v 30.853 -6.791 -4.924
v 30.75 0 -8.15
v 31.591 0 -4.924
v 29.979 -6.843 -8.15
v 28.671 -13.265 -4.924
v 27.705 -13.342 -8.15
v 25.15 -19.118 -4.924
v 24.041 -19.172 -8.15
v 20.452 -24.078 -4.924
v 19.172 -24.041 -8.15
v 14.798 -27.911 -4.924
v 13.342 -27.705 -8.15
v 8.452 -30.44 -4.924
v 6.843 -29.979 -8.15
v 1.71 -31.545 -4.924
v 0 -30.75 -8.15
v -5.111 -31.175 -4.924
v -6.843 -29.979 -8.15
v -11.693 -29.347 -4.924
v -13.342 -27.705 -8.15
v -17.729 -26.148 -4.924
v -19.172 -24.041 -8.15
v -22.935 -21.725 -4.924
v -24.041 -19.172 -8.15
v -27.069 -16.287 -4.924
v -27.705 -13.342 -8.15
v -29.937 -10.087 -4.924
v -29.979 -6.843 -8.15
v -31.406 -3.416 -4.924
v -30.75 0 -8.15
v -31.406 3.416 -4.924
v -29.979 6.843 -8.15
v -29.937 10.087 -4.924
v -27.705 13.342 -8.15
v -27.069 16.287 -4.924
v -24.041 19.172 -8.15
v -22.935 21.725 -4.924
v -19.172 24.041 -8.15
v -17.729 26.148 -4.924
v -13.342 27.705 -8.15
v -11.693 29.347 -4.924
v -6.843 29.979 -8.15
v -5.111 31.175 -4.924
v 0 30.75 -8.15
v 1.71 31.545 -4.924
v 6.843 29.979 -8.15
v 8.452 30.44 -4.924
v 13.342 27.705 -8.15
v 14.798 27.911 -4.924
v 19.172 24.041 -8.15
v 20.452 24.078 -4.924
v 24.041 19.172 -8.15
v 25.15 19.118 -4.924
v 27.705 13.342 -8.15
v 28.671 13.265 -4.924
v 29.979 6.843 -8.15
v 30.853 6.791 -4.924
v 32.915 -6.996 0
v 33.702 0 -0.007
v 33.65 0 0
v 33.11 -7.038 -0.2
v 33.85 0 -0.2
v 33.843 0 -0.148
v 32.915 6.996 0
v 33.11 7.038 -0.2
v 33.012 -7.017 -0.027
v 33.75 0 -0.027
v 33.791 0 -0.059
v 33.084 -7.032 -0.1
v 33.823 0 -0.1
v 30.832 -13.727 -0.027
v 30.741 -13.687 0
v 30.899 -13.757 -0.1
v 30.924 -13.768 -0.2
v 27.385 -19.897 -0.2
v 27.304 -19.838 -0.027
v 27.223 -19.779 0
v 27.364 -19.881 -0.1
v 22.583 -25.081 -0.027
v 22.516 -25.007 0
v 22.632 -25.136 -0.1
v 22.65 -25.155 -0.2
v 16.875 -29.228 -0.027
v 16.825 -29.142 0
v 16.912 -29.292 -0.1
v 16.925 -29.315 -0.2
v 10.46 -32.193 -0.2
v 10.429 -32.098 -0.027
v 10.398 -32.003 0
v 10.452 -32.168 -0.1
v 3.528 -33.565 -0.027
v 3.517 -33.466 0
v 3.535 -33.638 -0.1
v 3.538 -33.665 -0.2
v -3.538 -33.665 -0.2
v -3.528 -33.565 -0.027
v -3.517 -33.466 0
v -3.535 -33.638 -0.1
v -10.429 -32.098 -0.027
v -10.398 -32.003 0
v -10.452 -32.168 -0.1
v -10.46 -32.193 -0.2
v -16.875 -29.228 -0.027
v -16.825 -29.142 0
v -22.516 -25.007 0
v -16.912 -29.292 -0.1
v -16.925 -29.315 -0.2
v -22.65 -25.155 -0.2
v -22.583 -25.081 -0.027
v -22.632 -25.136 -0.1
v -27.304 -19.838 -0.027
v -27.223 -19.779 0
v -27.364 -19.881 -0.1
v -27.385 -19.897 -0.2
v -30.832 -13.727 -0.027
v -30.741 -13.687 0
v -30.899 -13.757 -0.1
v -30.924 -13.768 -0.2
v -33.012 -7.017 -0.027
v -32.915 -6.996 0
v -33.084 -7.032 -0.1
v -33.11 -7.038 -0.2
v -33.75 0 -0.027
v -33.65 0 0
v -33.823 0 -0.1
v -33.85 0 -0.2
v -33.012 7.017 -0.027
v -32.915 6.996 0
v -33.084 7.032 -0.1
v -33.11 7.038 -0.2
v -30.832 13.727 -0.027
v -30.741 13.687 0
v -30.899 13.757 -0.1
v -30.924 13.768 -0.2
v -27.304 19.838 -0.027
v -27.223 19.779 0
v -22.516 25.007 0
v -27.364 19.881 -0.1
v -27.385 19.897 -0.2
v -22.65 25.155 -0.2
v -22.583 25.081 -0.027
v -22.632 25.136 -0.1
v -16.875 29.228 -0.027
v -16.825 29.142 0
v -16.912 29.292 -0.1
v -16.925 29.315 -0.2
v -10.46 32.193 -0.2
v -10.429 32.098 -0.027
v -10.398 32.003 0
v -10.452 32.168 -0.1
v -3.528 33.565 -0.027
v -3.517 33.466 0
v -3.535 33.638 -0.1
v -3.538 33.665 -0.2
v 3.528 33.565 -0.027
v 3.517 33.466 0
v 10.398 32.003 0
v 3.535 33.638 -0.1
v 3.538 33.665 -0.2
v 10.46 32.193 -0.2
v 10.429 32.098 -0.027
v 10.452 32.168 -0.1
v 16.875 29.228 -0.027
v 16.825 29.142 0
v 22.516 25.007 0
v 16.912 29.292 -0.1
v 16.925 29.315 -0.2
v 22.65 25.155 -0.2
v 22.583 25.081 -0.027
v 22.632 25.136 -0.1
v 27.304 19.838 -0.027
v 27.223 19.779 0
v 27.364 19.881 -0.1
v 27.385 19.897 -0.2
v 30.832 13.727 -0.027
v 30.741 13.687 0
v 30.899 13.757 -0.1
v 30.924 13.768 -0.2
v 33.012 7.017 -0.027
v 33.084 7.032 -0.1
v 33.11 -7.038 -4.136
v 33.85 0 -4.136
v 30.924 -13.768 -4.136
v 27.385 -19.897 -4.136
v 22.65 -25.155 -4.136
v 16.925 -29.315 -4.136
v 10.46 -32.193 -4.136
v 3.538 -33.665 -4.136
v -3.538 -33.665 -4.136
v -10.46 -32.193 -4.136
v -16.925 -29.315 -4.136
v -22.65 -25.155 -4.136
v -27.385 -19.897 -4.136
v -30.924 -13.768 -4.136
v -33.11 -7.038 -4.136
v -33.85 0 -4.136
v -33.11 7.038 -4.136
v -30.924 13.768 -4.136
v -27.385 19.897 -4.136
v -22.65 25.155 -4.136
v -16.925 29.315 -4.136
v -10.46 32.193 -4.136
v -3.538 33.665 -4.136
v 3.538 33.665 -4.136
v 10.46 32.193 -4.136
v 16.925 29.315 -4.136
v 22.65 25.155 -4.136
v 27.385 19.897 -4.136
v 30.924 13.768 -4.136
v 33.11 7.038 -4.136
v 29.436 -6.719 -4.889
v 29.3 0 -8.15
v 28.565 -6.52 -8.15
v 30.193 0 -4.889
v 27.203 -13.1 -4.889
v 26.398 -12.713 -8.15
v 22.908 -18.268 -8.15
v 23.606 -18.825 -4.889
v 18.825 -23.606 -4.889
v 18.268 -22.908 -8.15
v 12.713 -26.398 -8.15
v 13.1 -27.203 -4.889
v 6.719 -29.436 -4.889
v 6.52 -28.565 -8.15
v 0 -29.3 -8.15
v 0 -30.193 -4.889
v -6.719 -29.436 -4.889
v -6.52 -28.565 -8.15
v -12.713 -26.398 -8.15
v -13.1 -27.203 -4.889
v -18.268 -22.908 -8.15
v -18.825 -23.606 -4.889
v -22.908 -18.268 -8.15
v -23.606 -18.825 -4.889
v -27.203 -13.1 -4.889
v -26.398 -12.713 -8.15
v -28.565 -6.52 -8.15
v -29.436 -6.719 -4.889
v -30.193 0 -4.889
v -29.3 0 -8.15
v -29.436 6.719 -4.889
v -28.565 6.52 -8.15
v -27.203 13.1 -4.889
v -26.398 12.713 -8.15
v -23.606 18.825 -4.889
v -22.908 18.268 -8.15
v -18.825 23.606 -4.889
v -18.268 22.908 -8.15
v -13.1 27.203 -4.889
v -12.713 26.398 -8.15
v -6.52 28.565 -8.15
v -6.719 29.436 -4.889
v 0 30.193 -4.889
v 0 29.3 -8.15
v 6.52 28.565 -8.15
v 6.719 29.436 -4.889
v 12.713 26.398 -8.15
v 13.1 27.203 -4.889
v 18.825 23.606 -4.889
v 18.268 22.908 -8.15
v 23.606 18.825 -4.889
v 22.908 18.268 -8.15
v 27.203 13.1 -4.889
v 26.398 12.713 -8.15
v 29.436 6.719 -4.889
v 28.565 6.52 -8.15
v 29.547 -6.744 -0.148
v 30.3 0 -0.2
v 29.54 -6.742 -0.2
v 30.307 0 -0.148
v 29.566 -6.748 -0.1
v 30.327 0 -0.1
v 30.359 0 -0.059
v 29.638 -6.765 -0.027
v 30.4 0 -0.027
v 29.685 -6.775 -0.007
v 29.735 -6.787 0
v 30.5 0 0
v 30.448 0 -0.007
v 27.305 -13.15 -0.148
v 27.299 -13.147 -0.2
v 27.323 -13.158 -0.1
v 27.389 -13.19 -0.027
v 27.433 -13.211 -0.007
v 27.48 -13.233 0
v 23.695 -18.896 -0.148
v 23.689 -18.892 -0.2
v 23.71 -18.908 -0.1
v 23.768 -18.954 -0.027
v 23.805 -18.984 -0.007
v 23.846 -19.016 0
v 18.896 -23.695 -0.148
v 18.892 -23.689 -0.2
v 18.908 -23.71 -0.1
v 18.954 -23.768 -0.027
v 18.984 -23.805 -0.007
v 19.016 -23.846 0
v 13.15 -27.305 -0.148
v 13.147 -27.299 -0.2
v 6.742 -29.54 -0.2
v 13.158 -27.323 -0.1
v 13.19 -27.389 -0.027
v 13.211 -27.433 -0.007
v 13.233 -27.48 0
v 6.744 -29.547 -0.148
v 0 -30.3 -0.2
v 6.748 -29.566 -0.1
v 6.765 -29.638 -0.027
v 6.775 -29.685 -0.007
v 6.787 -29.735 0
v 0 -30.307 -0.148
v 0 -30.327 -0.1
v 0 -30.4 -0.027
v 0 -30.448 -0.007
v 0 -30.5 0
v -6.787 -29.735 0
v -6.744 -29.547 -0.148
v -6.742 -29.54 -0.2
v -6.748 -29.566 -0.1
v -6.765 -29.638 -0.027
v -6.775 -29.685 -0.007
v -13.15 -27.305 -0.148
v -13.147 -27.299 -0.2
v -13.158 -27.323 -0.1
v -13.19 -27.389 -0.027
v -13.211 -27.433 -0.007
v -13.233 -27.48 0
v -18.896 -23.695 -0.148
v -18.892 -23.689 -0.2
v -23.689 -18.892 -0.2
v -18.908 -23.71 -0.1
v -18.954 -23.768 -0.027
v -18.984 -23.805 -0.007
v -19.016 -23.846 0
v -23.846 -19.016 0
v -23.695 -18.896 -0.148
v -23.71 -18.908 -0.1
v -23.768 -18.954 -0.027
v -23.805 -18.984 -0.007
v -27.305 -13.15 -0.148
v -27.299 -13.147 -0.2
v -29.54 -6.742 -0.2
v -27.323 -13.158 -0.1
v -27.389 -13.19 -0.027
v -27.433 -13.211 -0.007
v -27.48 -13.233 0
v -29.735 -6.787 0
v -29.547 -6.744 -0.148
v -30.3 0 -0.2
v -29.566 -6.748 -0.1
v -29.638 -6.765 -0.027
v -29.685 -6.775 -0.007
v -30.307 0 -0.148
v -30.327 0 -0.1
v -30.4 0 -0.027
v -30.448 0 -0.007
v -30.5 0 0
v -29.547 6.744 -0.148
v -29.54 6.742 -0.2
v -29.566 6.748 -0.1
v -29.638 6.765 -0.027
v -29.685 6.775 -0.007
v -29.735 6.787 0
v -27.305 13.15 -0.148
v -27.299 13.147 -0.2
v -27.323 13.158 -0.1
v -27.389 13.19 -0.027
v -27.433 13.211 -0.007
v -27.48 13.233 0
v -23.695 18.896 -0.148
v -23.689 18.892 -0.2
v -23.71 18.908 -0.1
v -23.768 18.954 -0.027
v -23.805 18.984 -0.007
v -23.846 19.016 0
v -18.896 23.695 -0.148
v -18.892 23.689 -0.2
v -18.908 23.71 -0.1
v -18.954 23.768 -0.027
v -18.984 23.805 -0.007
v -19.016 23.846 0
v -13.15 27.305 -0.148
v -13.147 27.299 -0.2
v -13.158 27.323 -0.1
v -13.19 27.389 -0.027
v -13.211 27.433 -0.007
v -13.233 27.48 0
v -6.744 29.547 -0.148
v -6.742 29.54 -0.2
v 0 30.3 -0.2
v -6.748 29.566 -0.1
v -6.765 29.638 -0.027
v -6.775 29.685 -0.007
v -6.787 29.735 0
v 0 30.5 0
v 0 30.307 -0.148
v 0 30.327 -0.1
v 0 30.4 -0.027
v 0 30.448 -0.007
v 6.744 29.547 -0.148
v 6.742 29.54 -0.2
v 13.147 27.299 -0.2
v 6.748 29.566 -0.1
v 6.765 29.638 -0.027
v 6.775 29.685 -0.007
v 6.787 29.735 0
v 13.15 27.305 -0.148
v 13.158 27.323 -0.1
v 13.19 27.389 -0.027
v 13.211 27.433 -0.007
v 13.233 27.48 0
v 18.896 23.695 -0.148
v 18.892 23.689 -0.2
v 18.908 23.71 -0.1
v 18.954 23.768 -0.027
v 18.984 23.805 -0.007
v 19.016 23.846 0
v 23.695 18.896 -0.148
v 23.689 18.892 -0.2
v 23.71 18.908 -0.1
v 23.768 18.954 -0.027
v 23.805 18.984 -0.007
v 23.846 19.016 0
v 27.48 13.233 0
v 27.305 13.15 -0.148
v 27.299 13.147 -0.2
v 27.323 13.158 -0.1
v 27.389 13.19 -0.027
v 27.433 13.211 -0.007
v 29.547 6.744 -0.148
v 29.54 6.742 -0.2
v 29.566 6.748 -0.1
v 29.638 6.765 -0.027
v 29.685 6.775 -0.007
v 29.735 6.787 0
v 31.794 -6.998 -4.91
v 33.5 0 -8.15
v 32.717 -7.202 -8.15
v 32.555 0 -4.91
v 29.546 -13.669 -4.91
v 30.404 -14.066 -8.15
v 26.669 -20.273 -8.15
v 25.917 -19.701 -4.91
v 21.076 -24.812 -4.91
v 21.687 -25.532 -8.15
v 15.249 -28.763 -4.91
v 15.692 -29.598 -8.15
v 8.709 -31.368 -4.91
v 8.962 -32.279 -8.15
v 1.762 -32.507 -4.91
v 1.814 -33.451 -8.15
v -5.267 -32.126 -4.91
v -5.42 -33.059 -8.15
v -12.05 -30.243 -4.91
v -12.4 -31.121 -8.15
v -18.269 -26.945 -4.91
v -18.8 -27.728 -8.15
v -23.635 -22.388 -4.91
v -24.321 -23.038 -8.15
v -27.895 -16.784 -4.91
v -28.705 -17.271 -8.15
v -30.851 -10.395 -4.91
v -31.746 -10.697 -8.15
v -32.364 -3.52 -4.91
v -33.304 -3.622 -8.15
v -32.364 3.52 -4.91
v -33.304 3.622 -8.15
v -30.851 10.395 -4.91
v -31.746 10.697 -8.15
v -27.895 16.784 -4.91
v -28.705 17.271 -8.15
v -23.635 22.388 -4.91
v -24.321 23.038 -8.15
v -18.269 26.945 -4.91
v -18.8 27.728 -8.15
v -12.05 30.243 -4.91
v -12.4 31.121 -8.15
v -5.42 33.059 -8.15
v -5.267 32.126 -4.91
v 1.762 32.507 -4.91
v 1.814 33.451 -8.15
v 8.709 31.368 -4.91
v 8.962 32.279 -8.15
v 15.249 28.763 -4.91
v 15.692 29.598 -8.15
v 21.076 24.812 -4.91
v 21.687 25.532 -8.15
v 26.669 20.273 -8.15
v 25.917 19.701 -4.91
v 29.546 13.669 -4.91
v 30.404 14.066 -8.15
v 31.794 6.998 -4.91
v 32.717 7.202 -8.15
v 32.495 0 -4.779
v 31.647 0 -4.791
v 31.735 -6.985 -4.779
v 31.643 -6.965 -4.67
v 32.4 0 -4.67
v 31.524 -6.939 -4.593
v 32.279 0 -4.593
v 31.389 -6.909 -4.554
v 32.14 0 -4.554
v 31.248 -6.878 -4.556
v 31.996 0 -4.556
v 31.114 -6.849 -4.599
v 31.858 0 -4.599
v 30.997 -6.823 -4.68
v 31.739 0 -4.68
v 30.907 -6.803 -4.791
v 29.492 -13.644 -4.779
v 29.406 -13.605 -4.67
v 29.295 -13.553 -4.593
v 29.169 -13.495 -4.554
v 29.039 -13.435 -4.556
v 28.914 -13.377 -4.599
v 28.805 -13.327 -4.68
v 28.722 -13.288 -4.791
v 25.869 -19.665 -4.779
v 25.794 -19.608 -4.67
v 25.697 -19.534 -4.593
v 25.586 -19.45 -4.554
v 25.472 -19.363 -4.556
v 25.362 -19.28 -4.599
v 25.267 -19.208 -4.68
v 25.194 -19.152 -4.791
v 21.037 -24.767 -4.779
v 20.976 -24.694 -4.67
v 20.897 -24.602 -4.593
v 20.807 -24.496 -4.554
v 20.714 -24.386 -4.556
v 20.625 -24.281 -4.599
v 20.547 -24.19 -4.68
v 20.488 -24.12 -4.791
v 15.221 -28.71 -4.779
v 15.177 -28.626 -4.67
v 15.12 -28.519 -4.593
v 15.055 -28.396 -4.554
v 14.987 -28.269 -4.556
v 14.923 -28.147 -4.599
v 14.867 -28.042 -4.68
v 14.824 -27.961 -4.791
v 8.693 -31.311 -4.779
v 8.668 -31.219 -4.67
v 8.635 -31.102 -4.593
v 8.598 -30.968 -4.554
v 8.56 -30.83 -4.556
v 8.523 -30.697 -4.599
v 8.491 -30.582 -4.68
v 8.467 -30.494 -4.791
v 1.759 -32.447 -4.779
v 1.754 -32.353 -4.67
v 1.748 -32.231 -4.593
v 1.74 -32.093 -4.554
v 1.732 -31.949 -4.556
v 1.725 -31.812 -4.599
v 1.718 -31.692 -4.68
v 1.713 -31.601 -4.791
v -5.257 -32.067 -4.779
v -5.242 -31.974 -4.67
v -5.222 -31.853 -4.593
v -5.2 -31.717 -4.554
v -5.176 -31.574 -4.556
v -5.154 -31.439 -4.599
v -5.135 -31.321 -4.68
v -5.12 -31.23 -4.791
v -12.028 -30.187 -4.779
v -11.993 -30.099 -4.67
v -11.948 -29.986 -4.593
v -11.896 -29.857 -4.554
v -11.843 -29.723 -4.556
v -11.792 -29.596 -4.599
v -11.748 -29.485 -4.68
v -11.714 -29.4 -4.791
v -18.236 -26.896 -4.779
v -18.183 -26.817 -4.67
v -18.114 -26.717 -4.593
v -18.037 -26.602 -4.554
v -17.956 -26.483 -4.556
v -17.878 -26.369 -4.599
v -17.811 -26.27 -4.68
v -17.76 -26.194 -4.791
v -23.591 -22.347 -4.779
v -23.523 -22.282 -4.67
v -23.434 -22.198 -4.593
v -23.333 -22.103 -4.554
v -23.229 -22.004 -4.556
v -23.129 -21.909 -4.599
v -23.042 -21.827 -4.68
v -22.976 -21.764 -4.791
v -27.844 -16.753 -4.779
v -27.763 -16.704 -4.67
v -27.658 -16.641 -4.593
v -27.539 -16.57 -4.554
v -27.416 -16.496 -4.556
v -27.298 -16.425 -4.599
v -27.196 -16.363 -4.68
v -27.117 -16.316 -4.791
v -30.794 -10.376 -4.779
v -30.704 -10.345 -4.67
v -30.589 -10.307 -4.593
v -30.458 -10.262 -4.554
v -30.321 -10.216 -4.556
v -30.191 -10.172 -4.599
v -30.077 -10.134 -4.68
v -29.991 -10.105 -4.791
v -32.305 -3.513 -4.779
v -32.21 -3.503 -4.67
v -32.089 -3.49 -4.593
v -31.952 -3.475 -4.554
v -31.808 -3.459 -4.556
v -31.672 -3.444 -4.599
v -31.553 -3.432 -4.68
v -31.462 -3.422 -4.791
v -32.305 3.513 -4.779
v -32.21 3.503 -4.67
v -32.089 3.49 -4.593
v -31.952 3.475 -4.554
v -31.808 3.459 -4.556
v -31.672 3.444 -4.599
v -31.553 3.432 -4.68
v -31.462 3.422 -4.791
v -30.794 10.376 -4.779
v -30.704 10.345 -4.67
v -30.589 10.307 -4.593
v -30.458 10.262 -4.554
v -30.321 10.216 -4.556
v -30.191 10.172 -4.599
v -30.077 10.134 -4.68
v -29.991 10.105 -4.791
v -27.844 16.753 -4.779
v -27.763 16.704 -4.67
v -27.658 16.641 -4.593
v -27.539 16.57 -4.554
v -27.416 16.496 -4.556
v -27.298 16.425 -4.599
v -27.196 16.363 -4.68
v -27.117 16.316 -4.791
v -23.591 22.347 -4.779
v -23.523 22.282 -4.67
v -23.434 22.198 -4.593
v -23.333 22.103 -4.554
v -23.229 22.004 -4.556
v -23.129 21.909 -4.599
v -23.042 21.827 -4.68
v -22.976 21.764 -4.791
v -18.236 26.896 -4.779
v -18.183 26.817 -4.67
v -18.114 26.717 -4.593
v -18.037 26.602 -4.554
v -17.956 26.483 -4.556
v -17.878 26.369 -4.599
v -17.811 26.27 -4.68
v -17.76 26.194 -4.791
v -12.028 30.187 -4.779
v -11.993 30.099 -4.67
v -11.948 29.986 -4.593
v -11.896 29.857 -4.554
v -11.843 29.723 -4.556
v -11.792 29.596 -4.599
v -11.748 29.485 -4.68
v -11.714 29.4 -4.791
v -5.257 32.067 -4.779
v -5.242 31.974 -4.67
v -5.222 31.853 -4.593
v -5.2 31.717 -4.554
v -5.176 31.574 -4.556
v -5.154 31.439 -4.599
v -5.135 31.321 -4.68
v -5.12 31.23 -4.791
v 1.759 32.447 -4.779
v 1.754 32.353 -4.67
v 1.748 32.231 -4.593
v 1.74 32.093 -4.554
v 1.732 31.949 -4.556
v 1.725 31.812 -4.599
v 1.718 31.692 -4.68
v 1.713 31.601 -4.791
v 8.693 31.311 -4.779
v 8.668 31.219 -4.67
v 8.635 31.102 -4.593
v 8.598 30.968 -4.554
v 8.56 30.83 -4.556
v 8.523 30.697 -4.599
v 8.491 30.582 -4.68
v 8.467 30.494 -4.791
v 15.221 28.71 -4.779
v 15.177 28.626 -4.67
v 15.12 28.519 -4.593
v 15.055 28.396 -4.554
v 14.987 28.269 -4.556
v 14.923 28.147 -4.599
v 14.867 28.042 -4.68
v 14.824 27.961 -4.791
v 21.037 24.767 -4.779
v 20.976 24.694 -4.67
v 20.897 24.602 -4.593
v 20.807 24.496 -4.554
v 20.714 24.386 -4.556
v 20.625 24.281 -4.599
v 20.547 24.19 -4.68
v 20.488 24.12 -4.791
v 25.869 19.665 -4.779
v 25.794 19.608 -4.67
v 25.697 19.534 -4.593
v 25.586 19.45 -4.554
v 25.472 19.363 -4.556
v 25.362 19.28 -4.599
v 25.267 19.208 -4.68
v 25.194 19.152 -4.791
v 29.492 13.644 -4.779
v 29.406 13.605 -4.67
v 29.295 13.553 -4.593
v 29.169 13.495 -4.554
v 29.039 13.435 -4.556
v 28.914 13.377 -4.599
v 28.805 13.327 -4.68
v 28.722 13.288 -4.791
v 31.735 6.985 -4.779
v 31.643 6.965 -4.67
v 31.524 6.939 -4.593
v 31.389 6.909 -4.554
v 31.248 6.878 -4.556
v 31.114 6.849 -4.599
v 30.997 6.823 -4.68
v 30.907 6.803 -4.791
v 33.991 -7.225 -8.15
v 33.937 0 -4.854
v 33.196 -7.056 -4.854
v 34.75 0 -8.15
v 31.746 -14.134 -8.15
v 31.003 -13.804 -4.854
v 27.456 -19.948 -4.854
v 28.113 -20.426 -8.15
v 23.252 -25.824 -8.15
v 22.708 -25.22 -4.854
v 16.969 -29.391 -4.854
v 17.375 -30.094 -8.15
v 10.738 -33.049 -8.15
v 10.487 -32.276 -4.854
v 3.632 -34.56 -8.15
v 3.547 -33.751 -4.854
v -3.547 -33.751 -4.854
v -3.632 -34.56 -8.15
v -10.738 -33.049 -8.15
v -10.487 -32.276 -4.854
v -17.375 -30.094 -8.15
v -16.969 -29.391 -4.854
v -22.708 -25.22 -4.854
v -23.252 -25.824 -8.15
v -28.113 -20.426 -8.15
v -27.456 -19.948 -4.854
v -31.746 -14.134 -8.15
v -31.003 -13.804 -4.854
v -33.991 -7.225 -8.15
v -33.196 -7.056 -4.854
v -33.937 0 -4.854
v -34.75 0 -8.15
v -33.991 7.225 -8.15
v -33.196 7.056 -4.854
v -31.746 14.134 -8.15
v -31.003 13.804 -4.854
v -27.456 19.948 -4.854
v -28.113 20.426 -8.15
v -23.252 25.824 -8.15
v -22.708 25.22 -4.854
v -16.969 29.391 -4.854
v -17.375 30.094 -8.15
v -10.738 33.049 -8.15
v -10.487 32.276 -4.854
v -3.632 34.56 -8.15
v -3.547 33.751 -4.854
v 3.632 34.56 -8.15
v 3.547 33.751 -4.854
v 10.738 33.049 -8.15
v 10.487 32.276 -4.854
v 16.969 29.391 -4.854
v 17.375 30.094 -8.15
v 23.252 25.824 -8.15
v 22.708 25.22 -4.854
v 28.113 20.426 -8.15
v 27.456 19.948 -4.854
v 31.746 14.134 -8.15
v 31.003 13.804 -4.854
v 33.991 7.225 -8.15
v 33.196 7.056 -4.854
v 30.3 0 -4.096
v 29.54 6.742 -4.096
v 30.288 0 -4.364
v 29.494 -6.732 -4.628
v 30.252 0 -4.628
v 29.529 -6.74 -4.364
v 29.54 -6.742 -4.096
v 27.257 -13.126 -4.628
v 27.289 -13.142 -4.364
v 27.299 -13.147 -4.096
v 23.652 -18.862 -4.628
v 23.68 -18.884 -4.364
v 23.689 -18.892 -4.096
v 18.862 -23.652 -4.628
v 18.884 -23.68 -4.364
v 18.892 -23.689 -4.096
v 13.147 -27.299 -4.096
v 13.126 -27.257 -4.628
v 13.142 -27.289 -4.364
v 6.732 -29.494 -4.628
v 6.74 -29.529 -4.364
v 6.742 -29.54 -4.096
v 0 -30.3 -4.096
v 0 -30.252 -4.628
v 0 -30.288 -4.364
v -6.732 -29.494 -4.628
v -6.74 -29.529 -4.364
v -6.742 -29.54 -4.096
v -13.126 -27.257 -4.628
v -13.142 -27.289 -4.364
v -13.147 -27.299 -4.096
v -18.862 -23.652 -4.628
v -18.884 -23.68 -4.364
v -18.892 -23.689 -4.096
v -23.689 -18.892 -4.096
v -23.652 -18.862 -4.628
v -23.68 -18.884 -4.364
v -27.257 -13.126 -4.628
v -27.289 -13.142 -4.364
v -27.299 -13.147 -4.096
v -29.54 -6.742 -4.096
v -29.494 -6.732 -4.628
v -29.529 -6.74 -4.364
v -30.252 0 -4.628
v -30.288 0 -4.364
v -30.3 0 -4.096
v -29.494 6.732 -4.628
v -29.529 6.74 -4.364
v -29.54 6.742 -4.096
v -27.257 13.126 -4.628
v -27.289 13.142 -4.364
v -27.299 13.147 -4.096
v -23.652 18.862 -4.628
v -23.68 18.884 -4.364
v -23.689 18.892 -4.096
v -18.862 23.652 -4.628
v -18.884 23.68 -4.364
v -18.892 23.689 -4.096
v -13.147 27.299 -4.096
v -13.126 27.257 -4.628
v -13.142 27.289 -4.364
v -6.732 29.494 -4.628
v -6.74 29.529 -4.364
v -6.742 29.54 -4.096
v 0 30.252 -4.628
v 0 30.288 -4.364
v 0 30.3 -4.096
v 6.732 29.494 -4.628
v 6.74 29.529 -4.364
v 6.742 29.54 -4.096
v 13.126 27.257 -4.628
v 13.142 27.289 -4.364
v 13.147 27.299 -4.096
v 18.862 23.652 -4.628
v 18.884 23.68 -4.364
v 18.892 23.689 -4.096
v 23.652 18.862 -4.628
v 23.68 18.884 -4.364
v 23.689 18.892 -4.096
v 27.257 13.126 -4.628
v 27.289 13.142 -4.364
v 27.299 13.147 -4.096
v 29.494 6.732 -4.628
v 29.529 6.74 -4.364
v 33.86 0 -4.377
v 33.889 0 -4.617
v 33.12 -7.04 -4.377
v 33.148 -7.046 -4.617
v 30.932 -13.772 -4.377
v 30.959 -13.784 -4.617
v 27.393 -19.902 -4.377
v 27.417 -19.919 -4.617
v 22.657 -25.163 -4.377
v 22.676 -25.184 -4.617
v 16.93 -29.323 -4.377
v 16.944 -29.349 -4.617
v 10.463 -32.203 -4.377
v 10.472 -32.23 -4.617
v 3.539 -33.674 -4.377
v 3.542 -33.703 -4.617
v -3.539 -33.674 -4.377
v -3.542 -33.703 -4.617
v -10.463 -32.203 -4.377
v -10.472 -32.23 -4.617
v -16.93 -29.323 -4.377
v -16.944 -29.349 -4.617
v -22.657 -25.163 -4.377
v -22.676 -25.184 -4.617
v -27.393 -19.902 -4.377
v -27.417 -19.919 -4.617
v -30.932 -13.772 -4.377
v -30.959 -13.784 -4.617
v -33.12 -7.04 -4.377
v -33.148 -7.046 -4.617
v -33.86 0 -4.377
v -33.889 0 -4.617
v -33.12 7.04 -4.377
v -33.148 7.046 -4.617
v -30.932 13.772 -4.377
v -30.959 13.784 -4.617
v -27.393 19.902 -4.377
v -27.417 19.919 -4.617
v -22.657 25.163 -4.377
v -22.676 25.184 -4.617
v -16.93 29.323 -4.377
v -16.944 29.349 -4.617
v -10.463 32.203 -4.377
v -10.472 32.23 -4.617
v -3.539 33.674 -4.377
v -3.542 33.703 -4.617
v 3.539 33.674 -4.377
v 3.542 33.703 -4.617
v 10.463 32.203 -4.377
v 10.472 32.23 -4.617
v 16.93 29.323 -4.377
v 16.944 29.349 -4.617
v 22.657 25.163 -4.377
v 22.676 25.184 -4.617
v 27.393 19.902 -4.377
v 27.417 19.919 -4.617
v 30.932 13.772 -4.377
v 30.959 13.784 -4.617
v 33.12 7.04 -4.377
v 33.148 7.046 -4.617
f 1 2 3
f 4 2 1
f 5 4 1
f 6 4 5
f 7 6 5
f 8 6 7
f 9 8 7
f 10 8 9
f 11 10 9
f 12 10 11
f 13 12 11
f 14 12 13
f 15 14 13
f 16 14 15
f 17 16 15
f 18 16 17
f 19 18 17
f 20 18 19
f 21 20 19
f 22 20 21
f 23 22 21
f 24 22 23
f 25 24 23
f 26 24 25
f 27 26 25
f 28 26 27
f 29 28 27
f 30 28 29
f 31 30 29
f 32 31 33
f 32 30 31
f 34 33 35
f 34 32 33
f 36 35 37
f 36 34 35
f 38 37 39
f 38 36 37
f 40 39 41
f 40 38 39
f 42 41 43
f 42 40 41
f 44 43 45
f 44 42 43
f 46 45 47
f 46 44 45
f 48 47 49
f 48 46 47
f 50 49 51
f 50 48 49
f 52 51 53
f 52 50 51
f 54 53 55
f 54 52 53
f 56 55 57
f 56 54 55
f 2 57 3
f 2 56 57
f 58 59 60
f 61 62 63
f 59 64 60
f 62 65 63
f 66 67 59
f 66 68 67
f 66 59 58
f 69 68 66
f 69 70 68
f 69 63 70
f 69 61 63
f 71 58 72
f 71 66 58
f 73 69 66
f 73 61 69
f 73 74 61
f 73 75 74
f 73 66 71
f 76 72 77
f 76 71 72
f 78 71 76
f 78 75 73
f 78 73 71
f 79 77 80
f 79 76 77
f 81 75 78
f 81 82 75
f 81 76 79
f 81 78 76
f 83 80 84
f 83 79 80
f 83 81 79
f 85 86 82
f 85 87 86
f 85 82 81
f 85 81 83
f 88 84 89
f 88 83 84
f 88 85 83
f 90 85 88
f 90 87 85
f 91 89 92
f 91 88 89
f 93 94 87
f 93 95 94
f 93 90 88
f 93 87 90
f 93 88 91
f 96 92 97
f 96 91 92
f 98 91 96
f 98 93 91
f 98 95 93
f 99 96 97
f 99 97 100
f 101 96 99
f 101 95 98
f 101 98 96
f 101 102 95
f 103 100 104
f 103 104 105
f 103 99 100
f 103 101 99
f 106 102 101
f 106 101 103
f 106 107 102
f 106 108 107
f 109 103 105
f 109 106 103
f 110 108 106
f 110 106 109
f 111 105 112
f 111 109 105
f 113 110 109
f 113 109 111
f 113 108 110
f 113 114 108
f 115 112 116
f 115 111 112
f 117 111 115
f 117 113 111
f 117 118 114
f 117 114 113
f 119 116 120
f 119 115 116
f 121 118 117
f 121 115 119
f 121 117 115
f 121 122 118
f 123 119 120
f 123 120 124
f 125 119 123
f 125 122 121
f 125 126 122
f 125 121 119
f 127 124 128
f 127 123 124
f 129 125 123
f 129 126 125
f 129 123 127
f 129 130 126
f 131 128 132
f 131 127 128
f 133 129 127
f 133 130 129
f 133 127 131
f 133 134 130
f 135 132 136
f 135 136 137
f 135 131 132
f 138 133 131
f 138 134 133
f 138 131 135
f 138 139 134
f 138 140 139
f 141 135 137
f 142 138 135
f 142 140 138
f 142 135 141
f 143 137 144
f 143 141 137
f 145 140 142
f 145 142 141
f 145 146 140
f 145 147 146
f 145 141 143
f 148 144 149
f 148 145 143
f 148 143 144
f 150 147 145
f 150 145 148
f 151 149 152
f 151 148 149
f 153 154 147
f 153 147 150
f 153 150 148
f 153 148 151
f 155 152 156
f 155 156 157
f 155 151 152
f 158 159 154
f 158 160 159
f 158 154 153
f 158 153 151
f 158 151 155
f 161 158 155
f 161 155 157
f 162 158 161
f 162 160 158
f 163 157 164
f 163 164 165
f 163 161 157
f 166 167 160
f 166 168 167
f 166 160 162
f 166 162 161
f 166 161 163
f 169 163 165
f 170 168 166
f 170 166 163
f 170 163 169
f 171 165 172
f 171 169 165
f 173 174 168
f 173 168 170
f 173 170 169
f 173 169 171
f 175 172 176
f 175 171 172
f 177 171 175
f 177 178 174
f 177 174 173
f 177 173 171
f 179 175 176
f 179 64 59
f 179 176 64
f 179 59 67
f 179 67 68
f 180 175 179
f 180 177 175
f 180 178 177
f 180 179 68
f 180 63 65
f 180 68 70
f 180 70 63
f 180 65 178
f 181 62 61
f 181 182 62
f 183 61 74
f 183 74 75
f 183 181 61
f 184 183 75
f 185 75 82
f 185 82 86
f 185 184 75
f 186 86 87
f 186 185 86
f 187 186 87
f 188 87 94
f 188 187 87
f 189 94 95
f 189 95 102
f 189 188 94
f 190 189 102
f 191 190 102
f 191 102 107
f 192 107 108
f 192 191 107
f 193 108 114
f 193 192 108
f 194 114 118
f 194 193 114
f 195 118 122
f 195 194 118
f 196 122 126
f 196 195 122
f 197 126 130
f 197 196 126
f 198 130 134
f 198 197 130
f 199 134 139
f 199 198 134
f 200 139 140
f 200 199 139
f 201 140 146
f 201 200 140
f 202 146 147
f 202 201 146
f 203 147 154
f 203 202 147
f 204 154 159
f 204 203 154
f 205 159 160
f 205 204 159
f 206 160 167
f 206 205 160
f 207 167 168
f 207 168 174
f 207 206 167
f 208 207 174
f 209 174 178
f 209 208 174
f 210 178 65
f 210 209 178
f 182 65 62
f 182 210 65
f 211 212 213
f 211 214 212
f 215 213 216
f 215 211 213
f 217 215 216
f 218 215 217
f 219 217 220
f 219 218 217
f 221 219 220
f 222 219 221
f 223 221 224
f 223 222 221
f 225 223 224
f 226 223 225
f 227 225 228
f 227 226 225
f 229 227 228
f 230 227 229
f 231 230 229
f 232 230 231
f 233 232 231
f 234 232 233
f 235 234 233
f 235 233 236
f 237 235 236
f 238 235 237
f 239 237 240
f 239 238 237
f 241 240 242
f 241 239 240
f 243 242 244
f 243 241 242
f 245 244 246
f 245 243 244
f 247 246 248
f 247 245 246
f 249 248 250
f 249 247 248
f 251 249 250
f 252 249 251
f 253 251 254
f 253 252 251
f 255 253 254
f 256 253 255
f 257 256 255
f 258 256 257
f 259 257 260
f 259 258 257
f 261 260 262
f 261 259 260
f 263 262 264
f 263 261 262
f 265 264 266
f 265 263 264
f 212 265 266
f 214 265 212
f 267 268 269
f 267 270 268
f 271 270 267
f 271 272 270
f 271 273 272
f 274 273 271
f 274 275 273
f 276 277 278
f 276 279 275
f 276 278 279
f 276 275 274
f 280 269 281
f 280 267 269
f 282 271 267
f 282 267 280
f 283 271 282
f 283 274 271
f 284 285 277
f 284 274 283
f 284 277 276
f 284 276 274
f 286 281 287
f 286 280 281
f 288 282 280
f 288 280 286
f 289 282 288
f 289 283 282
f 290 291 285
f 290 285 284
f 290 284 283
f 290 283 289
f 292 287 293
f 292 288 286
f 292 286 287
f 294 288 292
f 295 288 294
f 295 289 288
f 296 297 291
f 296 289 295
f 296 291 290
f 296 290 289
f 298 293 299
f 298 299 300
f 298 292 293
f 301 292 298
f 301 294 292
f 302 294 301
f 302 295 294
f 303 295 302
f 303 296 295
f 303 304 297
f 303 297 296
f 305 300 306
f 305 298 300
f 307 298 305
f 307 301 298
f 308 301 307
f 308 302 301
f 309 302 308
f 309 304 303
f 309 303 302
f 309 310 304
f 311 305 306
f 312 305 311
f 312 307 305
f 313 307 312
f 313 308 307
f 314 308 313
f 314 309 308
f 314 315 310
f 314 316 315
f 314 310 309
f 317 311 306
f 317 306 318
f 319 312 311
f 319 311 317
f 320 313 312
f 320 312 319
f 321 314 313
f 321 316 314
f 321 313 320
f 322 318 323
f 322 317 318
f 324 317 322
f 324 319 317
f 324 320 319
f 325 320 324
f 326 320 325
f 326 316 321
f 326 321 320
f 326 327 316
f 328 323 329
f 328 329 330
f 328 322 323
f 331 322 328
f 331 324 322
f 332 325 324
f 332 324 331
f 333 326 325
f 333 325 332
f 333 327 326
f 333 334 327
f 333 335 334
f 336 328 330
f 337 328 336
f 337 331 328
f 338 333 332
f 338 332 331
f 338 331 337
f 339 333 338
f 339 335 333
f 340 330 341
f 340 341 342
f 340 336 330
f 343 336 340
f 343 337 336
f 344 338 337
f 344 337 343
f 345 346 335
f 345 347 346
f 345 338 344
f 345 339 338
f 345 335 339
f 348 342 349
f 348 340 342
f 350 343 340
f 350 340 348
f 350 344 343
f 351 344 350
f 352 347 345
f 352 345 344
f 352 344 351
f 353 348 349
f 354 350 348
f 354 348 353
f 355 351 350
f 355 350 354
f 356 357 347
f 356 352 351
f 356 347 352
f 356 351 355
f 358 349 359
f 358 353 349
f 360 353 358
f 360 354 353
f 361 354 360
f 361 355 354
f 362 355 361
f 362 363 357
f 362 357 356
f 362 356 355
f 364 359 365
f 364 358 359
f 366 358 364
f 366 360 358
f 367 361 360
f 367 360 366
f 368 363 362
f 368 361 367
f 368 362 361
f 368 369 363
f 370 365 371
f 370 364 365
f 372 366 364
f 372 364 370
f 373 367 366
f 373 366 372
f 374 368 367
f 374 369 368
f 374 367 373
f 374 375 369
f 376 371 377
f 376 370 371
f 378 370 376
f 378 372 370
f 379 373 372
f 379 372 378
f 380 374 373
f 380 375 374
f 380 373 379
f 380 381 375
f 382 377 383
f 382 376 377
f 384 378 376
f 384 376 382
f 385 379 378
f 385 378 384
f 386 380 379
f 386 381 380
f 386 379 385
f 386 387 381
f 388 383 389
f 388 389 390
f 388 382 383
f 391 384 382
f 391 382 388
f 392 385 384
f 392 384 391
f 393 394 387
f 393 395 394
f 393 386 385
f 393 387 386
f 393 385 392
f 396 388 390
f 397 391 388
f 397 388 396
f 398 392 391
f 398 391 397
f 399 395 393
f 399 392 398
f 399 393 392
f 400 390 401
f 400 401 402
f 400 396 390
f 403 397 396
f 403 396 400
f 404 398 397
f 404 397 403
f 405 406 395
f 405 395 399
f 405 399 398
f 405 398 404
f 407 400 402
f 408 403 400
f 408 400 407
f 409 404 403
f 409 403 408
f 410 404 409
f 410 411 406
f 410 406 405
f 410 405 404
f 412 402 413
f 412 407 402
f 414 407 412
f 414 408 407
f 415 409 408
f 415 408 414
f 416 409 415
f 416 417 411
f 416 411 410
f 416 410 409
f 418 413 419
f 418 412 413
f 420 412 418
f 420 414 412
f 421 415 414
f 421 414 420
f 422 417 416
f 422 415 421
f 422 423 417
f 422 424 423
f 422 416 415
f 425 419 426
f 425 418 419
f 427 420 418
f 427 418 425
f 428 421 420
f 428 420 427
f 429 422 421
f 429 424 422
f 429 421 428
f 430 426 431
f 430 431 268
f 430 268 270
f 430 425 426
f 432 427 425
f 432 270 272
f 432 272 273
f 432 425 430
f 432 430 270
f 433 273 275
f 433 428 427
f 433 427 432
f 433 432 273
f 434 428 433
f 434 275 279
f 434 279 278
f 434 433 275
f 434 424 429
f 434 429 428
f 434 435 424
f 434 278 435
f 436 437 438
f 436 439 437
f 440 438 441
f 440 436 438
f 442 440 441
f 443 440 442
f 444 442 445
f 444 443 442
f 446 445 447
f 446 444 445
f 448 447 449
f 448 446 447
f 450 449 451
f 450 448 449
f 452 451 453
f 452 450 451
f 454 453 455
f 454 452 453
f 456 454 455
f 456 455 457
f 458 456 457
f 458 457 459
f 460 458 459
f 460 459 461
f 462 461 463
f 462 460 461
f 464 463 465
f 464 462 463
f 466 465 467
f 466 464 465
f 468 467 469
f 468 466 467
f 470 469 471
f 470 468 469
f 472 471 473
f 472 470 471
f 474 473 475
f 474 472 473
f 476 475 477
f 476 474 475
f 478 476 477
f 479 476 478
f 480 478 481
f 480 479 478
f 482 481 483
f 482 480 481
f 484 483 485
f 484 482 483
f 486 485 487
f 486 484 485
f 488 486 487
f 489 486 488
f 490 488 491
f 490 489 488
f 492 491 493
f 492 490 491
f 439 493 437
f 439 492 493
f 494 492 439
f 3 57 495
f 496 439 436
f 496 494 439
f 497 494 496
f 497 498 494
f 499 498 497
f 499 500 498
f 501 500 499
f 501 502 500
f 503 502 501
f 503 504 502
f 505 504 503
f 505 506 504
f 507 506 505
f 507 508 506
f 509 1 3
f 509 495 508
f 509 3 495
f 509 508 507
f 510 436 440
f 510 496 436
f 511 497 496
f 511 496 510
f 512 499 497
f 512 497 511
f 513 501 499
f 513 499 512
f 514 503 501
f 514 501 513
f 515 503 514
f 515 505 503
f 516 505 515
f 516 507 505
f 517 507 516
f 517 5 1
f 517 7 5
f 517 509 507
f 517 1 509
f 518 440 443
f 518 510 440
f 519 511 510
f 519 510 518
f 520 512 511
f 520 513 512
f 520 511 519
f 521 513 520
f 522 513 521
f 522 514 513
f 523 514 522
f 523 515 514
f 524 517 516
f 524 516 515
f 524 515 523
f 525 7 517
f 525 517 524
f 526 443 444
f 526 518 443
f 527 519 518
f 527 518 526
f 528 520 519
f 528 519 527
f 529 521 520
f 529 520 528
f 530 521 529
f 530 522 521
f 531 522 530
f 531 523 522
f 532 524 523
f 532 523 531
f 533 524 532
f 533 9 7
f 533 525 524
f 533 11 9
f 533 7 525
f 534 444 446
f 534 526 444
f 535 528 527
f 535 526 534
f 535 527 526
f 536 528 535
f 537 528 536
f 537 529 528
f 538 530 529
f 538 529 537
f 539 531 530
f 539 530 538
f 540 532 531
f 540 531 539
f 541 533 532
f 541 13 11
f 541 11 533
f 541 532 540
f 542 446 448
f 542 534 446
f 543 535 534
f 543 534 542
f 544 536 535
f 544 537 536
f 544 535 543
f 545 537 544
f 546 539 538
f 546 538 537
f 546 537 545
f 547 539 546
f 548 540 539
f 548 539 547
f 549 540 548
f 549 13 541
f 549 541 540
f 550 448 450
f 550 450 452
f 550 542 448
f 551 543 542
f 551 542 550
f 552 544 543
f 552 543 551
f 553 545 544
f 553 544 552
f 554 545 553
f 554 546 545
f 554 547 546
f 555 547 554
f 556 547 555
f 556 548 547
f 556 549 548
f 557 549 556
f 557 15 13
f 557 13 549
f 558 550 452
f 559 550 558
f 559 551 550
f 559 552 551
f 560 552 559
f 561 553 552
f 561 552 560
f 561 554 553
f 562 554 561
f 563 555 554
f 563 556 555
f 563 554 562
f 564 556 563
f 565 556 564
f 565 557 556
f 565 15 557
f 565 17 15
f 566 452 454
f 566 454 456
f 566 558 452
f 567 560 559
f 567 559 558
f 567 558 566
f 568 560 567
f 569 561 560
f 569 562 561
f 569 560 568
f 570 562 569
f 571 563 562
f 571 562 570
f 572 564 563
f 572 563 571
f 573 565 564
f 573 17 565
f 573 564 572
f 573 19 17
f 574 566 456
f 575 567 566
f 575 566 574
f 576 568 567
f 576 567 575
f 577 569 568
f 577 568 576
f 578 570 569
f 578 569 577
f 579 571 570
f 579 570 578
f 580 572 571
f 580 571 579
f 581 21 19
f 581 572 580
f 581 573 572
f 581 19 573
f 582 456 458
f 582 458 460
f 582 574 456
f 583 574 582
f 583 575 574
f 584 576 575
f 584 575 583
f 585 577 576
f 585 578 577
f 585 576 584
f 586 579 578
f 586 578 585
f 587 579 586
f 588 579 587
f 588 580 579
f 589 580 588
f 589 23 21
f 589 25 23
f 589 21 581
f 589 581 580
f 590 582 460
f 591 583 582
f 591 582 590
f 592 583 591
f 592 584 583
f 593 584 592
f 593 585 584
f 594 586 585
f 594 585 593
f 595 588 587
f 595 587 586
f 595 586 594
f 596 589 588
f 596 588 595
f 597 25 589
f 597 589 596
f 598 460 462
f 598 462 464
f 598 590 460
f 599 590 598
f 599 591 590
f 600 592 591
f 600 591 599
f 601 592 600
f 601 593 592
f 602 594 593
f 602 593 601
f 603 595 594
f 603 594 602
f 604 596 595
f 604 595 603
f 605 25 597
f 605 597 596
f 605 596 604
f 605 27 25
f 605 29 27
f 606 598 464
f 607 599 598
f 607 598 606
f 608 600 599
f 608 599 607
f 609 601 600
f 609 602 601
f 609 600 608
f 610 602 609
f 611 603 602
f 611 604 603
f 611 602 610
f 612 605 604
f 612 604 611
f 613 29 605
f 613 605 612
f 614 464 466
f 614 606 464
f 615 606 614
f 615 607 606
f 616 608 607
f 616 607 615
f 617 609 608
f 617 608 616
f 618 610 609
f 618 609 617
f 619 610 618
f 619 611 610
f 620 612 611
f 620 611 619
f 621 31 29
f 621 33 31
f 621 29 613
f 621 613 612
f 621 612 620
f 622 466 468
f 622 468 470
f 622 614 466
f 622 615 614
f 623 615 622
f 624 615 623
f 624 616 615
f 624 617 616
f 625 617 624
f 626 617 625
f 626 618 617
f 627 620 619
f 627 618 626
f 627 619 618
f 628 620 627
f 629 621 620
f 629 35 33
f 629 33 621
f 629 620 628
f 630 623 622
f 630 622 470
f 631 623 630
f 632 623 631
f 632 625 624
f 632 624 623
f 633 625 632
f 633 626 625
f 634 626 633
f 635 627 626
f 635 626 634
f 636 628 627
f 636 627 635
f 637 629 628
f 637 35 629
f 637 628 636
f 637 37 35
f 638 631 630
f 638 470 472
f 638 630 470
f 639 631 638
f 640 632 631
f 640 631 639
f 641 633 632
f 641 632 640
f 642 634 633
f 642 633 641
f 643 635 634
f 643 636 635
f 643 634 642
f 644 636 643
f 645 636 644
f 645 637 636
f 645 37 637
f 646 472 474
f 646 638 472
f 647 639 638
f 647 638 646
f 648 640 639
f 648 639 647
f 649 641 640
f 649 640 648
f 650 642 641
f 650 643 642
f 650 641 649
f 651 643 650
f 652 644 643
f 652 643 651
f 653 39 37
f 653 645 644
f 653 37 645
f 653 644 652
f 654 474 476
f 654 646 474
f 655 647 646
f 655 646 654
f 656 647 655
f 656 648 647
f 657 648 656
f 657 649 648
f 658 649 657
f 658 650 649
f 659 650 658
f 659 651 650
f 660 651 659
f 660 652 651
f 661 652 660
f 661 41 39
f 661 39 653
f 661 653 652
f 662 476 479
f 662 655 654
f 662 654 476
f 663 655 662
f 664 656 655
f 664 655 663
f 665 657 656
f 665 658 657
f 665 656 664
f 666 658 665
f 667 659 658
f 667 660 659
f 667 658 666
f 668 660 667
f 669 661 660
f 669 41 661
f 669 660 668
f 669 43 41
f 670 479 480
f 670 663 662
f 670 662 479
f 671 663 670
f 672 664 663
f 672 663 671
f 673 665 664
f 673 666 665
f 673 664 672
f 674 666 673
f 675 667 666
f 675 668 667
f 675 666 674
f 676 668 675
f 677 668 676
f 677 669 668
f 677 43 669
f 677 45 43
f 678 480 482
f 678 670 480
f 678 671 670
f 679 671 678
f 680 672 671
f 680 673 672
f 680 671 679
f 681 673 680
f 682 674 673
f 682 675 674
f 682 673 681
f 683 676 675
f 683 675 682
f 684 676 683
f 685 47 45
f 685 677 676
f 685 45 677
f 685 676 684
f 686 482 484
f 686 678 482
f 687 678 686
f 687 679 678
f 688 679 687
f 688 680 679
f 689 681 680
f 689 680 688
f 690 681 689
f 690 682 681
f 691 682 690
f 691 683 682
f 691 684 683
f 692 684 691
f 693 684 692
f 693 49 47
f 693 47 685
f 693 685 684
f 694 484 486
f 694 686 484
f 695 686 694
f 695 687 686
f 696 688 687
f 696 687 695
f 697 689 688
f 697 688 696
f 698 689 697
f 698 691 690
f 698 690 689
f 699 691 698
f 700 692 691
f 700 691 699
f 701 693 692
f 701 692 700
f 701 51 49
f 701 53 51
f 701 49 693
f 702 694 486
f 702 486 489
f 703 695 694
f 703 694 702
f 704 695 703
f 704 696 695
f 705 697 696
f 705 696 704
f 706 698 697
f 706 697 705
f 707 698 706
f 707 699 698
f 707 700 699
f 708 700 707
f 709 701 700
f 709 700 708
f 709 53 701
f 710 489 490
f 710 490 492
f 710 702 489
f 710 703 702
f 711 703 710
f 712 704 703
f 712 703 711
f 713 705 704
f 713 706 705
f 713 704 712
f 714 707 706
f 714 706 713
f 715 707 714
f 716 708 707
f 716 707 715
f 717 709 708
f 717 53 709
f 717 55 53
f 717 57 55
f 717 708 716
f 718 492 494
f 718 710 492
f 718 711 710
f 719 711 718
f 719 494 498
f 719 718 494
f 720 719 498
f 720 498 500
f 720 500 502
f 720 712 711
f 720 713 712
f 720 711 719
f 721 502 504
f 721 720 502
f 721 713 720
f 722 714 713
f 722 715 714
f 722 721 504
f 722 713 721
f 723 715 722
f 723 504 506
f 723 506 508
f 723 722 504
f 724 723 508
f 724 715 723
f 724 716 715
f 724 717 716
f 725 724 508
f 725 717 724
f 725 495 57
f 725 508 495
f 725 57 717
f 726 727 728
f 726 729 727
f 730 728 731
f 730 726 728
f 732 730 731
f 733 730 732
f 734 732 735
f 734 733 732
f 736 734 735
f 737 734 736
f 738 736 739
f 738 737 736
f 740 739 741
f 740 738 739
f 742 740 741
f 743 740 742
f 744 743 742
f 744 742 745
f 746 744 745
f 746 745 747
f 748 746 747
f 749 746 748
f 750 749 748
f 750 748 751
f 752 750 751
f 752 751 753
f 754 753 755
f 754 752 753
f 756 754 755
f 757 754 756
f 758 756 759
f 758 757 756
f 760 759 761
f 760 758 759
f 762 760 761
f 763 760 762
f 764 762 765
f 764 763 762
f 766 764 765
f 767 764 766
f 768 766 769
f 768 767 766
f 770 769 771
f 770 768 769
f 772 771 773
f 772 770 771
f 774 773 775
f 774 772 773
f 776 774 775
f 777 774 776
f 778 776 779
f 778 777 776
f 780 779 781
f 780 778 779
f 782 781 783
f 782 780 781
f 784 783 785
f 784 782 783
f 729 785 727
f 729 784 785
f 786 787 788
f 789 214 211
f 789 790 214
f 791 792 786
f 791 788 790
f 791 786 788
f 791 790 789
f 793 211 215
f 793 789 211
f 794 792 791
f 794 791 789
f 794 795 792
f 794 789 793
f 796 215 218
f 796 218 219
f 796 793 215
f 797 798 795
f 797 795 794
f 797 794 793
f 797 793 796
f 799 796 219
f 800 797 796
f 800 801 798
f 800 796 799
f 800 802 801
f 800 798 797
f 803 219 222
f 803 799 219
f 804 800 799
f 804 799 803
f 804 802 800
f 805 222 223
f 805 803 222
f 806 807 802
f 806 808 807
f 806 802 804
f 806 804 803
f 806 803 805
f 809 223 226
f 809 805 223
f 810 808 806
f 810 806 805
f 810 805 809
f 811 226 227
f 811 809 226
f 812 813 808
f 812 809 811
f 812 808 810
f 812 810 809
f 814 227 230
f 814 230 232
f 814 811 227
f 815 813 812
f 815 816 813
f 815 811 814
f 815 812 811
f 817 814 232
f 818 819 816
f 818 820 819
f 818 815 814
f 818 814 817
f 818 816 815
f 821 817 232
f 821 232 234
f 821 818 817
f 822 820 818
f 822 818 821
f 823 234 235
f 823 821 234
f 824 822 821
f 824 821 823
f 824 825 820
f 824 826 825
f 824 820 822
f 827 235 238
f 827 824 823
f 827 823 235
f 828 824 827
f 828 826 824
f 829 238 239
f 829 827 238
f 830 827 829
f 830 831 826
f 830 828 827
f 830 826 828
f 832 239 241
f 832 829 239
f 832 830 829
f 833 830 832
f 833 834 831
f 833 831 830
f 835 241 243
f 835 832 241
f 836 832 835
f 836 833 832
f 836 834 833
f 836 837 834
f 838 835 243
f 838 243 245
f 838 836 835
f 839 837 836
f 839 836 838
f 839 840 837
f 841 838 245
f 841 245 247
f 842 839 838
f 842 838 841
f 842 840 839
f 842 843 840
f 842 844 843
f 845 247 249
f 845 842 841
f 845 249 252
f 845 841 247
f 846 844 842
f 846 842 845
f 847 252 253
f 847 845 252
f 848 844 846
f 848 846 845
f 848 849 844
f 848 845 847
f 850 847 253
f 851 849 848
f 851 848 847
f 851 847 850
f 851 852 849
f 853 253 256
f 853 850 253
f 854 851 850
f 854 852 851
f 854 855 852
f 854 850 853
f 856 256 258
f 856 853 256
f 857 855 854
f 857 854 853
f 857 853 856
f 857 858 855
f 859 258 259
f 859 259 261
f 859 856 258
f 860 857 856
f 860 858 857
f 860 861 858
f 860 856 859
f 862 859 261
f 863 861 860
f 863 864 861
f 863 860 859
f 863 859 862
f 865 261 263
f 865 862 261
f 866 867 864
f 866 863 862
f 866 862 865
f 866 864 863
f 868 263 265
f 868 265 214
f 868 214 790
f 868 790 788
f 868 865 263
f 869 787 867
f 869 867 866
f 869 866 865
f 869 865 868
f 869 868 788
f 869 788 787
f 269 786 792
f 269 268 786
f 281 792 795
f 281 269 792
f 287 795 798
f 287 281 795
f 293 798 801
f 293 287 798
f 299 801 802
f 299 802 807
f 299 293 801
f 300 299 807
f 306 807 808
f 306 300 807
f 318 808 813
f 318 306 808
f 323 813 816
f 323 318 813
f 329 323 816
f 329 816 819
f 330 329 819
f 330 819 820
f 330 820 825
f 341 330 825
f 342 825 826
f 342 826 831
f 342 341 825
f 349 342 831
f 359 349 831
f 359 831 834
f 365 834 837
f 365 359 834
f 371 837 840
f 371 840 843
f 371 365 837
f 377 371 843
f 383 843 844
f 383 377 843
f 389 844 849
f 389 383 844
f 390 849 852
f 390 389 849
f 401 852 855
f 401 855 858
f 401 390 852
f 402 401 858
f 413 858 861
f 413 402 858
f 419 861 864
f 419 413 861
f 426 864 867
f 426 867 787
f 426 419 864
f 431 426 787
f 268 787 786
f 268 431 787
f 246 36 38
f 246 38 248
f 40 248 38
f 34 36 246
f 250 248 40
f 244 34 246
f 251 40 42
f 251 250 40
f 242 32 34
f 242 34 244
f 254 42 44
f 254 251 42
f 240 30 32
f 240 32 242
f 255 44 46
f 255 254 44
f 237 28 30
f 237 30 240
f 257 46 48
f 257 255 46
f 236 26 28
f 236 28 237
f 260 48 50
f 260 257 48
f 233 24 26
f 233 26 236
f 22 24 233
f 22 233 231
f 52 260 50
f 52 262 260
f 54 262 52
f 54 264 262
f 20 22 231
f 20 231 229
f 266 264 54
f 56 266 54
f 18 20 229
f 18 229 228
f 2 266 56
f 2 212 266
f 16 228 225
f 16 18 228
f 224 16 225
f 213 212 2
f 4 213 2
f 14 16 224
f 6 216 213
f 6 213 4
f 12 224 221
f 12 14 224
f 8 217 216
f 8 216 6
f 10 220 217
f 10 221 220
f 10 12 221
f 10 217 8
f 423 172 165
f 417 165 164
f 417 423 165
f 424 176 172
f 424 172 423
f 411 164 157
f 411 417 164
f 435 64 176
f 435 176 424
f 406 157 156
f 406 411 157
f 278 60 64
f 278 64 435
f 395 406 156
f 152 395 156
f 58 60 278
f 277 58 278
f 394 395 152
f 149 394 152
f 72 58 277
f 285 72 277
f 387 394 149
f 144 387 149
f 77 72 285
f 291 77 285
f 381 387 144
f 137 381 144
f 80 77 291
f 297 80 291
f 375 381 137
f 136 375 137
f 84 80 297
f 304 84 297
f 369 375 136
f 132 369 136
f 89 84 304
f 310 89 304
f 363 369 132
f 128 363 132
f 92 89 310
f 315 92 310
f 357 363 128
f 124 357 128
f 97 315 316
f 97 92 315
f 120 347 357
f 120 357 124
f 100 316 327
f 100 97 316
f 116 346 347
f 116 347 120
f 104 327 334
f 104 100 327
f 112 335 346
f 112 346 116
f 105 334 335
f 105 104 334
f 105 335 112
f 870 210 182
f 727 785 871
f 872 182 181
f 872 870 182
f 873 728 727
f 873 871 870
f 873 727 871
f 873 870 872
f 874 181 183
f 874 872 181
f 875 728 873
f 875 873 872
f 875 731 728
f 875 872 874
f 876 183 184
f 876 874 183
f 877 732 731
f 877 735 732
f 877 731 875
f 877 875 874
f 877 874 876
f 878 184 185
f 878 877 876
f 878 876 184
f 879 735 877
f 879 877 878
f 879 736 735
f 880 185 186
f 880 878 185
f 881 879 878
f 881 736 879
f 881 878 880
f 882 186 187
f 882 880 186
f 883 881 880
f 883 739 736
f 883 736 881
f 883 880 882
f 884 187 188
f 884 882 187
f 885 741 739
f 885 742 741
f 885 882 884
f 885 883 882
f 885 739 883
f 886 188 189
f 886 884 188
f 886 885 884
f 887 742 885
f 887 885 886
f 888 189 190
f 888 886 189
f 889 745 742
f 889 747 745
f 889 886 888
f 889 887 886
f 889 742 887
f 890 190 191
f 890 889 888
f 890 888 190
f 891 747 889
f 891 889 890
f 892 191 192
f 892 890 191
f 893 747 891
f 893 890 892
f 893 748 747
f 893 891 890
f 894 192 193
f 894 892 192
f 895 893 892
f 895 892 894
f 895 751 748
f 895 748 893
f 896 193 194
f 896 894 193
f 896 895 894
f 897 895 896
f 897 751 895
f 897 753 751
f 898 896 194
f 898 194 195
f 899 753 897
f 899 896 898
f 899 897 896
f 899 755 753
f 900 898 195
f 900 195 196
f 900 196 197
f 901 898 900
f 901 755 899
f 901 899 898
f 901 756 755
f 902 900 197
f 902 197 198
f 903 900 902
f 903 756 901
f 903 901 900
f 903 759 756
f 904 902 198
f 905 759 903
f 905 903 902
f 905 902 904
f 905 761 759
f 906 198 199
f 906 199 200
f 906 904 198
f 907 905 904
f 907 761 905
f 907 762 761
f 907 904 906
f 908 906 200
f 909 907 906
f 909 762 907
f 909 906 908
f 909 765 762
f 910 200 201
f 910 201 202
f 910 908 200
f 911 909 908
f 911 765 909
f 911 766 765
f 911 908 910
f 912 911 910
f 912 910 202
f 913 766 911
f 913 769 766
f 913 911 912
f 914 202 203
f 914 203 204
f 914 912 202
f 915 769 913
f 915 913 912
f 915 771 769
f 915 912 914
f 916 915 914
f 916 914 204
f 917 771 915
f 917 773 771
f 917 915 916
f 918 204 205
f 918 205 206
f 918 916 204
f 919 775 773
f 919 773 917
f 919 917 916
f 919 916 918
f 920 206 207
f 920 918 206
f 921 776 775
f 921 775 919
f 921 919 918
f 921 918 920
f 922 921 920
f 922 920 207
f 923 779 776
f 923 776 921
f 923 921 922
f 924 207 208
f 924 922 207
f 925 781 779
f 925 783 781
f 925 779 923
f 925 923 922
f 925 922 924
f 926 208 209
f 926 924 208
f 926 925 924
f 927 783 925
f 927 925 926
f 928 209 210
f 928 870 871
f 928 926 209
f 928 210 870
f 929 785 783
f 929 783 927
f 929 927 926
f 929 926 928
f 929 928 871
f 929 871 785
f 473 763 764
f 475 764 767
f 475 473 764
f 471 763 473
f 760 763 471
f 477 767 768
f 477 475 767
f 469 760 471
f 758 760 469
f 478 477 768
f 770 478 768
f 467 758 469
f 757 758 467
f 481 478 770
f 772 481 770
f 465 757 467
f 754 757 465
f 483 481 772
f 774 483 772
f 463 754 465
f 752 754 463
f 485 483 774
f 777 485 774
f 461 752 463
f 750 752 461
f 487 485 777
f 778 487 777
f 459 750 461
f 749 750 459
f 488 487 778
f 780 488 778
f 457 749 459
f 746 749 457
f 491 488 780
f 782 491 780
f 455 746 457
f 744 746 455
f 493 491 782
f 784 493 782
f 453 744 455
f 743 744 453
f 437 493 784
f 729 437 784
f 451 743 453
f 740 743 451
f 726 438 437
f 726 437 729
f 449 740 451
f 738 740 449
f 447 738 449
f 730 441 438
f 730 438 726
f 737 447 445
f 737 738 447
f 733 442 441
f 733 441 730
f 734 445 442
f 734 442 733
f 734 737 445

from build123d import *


with BuildPart() as part:
    # Sketch1 → Revolve1 (revolve)
    with BuildSketch(Plane(origin=(0, 0, 0), x_dir=(0, 0, -1), z_dir=(1, 0, 0)), mode=Mode.PRIVATE) as revolve1_sk:
        with BuildLine():
            Line((0, 30.5), (0, 33.65))
            ThreePointArc((0, 33.65), (0.058578644, 33.791421356), (0.2, 33.85))
            Line((0.2, 33.85), (4.135594176, 33.85))
            ThreePointArc((4.135594176, 33.85), (4.497341053, 33.871889996), (4.853808838, 33.937240535))
            Line((4.853808838, 33.937240535), (8.15, 34.75))
            Line((8.15, 34.75), (8.15, 33.5))
            Line((8.15, 33.5), (4.91, 32.555))
            ThreePointArc((4.91, 32.555), (4.55005161, 32.0678162), (4.923849273, 31.591175658))
            Line((4.923849273, 31.591175658), (8.15, 30.75))
            Line((8.15, 30.75), (8.15, 29.3))
            Line((8.15, 29.3), (4.889181759, 30.193374861))
            ThreePointArc((4.889181759, 30.193374861), (4.496398447, 30.273224225), (4.096476318, 30.3))
            Line((4.096476318, 30.3), (0.2, 30.3))
            ThreePointArc((0.2, 30.3), (0.058578644, 30.358578644), (0, 30.5))
        make_face()
    revolve(revolve1_sk.sketch.rotate(Axis((0, 0, 0), (0, 0, -1)), 90), axis=Axis((0, 0, 0), (0, 0, -1)))


solid = part.part
